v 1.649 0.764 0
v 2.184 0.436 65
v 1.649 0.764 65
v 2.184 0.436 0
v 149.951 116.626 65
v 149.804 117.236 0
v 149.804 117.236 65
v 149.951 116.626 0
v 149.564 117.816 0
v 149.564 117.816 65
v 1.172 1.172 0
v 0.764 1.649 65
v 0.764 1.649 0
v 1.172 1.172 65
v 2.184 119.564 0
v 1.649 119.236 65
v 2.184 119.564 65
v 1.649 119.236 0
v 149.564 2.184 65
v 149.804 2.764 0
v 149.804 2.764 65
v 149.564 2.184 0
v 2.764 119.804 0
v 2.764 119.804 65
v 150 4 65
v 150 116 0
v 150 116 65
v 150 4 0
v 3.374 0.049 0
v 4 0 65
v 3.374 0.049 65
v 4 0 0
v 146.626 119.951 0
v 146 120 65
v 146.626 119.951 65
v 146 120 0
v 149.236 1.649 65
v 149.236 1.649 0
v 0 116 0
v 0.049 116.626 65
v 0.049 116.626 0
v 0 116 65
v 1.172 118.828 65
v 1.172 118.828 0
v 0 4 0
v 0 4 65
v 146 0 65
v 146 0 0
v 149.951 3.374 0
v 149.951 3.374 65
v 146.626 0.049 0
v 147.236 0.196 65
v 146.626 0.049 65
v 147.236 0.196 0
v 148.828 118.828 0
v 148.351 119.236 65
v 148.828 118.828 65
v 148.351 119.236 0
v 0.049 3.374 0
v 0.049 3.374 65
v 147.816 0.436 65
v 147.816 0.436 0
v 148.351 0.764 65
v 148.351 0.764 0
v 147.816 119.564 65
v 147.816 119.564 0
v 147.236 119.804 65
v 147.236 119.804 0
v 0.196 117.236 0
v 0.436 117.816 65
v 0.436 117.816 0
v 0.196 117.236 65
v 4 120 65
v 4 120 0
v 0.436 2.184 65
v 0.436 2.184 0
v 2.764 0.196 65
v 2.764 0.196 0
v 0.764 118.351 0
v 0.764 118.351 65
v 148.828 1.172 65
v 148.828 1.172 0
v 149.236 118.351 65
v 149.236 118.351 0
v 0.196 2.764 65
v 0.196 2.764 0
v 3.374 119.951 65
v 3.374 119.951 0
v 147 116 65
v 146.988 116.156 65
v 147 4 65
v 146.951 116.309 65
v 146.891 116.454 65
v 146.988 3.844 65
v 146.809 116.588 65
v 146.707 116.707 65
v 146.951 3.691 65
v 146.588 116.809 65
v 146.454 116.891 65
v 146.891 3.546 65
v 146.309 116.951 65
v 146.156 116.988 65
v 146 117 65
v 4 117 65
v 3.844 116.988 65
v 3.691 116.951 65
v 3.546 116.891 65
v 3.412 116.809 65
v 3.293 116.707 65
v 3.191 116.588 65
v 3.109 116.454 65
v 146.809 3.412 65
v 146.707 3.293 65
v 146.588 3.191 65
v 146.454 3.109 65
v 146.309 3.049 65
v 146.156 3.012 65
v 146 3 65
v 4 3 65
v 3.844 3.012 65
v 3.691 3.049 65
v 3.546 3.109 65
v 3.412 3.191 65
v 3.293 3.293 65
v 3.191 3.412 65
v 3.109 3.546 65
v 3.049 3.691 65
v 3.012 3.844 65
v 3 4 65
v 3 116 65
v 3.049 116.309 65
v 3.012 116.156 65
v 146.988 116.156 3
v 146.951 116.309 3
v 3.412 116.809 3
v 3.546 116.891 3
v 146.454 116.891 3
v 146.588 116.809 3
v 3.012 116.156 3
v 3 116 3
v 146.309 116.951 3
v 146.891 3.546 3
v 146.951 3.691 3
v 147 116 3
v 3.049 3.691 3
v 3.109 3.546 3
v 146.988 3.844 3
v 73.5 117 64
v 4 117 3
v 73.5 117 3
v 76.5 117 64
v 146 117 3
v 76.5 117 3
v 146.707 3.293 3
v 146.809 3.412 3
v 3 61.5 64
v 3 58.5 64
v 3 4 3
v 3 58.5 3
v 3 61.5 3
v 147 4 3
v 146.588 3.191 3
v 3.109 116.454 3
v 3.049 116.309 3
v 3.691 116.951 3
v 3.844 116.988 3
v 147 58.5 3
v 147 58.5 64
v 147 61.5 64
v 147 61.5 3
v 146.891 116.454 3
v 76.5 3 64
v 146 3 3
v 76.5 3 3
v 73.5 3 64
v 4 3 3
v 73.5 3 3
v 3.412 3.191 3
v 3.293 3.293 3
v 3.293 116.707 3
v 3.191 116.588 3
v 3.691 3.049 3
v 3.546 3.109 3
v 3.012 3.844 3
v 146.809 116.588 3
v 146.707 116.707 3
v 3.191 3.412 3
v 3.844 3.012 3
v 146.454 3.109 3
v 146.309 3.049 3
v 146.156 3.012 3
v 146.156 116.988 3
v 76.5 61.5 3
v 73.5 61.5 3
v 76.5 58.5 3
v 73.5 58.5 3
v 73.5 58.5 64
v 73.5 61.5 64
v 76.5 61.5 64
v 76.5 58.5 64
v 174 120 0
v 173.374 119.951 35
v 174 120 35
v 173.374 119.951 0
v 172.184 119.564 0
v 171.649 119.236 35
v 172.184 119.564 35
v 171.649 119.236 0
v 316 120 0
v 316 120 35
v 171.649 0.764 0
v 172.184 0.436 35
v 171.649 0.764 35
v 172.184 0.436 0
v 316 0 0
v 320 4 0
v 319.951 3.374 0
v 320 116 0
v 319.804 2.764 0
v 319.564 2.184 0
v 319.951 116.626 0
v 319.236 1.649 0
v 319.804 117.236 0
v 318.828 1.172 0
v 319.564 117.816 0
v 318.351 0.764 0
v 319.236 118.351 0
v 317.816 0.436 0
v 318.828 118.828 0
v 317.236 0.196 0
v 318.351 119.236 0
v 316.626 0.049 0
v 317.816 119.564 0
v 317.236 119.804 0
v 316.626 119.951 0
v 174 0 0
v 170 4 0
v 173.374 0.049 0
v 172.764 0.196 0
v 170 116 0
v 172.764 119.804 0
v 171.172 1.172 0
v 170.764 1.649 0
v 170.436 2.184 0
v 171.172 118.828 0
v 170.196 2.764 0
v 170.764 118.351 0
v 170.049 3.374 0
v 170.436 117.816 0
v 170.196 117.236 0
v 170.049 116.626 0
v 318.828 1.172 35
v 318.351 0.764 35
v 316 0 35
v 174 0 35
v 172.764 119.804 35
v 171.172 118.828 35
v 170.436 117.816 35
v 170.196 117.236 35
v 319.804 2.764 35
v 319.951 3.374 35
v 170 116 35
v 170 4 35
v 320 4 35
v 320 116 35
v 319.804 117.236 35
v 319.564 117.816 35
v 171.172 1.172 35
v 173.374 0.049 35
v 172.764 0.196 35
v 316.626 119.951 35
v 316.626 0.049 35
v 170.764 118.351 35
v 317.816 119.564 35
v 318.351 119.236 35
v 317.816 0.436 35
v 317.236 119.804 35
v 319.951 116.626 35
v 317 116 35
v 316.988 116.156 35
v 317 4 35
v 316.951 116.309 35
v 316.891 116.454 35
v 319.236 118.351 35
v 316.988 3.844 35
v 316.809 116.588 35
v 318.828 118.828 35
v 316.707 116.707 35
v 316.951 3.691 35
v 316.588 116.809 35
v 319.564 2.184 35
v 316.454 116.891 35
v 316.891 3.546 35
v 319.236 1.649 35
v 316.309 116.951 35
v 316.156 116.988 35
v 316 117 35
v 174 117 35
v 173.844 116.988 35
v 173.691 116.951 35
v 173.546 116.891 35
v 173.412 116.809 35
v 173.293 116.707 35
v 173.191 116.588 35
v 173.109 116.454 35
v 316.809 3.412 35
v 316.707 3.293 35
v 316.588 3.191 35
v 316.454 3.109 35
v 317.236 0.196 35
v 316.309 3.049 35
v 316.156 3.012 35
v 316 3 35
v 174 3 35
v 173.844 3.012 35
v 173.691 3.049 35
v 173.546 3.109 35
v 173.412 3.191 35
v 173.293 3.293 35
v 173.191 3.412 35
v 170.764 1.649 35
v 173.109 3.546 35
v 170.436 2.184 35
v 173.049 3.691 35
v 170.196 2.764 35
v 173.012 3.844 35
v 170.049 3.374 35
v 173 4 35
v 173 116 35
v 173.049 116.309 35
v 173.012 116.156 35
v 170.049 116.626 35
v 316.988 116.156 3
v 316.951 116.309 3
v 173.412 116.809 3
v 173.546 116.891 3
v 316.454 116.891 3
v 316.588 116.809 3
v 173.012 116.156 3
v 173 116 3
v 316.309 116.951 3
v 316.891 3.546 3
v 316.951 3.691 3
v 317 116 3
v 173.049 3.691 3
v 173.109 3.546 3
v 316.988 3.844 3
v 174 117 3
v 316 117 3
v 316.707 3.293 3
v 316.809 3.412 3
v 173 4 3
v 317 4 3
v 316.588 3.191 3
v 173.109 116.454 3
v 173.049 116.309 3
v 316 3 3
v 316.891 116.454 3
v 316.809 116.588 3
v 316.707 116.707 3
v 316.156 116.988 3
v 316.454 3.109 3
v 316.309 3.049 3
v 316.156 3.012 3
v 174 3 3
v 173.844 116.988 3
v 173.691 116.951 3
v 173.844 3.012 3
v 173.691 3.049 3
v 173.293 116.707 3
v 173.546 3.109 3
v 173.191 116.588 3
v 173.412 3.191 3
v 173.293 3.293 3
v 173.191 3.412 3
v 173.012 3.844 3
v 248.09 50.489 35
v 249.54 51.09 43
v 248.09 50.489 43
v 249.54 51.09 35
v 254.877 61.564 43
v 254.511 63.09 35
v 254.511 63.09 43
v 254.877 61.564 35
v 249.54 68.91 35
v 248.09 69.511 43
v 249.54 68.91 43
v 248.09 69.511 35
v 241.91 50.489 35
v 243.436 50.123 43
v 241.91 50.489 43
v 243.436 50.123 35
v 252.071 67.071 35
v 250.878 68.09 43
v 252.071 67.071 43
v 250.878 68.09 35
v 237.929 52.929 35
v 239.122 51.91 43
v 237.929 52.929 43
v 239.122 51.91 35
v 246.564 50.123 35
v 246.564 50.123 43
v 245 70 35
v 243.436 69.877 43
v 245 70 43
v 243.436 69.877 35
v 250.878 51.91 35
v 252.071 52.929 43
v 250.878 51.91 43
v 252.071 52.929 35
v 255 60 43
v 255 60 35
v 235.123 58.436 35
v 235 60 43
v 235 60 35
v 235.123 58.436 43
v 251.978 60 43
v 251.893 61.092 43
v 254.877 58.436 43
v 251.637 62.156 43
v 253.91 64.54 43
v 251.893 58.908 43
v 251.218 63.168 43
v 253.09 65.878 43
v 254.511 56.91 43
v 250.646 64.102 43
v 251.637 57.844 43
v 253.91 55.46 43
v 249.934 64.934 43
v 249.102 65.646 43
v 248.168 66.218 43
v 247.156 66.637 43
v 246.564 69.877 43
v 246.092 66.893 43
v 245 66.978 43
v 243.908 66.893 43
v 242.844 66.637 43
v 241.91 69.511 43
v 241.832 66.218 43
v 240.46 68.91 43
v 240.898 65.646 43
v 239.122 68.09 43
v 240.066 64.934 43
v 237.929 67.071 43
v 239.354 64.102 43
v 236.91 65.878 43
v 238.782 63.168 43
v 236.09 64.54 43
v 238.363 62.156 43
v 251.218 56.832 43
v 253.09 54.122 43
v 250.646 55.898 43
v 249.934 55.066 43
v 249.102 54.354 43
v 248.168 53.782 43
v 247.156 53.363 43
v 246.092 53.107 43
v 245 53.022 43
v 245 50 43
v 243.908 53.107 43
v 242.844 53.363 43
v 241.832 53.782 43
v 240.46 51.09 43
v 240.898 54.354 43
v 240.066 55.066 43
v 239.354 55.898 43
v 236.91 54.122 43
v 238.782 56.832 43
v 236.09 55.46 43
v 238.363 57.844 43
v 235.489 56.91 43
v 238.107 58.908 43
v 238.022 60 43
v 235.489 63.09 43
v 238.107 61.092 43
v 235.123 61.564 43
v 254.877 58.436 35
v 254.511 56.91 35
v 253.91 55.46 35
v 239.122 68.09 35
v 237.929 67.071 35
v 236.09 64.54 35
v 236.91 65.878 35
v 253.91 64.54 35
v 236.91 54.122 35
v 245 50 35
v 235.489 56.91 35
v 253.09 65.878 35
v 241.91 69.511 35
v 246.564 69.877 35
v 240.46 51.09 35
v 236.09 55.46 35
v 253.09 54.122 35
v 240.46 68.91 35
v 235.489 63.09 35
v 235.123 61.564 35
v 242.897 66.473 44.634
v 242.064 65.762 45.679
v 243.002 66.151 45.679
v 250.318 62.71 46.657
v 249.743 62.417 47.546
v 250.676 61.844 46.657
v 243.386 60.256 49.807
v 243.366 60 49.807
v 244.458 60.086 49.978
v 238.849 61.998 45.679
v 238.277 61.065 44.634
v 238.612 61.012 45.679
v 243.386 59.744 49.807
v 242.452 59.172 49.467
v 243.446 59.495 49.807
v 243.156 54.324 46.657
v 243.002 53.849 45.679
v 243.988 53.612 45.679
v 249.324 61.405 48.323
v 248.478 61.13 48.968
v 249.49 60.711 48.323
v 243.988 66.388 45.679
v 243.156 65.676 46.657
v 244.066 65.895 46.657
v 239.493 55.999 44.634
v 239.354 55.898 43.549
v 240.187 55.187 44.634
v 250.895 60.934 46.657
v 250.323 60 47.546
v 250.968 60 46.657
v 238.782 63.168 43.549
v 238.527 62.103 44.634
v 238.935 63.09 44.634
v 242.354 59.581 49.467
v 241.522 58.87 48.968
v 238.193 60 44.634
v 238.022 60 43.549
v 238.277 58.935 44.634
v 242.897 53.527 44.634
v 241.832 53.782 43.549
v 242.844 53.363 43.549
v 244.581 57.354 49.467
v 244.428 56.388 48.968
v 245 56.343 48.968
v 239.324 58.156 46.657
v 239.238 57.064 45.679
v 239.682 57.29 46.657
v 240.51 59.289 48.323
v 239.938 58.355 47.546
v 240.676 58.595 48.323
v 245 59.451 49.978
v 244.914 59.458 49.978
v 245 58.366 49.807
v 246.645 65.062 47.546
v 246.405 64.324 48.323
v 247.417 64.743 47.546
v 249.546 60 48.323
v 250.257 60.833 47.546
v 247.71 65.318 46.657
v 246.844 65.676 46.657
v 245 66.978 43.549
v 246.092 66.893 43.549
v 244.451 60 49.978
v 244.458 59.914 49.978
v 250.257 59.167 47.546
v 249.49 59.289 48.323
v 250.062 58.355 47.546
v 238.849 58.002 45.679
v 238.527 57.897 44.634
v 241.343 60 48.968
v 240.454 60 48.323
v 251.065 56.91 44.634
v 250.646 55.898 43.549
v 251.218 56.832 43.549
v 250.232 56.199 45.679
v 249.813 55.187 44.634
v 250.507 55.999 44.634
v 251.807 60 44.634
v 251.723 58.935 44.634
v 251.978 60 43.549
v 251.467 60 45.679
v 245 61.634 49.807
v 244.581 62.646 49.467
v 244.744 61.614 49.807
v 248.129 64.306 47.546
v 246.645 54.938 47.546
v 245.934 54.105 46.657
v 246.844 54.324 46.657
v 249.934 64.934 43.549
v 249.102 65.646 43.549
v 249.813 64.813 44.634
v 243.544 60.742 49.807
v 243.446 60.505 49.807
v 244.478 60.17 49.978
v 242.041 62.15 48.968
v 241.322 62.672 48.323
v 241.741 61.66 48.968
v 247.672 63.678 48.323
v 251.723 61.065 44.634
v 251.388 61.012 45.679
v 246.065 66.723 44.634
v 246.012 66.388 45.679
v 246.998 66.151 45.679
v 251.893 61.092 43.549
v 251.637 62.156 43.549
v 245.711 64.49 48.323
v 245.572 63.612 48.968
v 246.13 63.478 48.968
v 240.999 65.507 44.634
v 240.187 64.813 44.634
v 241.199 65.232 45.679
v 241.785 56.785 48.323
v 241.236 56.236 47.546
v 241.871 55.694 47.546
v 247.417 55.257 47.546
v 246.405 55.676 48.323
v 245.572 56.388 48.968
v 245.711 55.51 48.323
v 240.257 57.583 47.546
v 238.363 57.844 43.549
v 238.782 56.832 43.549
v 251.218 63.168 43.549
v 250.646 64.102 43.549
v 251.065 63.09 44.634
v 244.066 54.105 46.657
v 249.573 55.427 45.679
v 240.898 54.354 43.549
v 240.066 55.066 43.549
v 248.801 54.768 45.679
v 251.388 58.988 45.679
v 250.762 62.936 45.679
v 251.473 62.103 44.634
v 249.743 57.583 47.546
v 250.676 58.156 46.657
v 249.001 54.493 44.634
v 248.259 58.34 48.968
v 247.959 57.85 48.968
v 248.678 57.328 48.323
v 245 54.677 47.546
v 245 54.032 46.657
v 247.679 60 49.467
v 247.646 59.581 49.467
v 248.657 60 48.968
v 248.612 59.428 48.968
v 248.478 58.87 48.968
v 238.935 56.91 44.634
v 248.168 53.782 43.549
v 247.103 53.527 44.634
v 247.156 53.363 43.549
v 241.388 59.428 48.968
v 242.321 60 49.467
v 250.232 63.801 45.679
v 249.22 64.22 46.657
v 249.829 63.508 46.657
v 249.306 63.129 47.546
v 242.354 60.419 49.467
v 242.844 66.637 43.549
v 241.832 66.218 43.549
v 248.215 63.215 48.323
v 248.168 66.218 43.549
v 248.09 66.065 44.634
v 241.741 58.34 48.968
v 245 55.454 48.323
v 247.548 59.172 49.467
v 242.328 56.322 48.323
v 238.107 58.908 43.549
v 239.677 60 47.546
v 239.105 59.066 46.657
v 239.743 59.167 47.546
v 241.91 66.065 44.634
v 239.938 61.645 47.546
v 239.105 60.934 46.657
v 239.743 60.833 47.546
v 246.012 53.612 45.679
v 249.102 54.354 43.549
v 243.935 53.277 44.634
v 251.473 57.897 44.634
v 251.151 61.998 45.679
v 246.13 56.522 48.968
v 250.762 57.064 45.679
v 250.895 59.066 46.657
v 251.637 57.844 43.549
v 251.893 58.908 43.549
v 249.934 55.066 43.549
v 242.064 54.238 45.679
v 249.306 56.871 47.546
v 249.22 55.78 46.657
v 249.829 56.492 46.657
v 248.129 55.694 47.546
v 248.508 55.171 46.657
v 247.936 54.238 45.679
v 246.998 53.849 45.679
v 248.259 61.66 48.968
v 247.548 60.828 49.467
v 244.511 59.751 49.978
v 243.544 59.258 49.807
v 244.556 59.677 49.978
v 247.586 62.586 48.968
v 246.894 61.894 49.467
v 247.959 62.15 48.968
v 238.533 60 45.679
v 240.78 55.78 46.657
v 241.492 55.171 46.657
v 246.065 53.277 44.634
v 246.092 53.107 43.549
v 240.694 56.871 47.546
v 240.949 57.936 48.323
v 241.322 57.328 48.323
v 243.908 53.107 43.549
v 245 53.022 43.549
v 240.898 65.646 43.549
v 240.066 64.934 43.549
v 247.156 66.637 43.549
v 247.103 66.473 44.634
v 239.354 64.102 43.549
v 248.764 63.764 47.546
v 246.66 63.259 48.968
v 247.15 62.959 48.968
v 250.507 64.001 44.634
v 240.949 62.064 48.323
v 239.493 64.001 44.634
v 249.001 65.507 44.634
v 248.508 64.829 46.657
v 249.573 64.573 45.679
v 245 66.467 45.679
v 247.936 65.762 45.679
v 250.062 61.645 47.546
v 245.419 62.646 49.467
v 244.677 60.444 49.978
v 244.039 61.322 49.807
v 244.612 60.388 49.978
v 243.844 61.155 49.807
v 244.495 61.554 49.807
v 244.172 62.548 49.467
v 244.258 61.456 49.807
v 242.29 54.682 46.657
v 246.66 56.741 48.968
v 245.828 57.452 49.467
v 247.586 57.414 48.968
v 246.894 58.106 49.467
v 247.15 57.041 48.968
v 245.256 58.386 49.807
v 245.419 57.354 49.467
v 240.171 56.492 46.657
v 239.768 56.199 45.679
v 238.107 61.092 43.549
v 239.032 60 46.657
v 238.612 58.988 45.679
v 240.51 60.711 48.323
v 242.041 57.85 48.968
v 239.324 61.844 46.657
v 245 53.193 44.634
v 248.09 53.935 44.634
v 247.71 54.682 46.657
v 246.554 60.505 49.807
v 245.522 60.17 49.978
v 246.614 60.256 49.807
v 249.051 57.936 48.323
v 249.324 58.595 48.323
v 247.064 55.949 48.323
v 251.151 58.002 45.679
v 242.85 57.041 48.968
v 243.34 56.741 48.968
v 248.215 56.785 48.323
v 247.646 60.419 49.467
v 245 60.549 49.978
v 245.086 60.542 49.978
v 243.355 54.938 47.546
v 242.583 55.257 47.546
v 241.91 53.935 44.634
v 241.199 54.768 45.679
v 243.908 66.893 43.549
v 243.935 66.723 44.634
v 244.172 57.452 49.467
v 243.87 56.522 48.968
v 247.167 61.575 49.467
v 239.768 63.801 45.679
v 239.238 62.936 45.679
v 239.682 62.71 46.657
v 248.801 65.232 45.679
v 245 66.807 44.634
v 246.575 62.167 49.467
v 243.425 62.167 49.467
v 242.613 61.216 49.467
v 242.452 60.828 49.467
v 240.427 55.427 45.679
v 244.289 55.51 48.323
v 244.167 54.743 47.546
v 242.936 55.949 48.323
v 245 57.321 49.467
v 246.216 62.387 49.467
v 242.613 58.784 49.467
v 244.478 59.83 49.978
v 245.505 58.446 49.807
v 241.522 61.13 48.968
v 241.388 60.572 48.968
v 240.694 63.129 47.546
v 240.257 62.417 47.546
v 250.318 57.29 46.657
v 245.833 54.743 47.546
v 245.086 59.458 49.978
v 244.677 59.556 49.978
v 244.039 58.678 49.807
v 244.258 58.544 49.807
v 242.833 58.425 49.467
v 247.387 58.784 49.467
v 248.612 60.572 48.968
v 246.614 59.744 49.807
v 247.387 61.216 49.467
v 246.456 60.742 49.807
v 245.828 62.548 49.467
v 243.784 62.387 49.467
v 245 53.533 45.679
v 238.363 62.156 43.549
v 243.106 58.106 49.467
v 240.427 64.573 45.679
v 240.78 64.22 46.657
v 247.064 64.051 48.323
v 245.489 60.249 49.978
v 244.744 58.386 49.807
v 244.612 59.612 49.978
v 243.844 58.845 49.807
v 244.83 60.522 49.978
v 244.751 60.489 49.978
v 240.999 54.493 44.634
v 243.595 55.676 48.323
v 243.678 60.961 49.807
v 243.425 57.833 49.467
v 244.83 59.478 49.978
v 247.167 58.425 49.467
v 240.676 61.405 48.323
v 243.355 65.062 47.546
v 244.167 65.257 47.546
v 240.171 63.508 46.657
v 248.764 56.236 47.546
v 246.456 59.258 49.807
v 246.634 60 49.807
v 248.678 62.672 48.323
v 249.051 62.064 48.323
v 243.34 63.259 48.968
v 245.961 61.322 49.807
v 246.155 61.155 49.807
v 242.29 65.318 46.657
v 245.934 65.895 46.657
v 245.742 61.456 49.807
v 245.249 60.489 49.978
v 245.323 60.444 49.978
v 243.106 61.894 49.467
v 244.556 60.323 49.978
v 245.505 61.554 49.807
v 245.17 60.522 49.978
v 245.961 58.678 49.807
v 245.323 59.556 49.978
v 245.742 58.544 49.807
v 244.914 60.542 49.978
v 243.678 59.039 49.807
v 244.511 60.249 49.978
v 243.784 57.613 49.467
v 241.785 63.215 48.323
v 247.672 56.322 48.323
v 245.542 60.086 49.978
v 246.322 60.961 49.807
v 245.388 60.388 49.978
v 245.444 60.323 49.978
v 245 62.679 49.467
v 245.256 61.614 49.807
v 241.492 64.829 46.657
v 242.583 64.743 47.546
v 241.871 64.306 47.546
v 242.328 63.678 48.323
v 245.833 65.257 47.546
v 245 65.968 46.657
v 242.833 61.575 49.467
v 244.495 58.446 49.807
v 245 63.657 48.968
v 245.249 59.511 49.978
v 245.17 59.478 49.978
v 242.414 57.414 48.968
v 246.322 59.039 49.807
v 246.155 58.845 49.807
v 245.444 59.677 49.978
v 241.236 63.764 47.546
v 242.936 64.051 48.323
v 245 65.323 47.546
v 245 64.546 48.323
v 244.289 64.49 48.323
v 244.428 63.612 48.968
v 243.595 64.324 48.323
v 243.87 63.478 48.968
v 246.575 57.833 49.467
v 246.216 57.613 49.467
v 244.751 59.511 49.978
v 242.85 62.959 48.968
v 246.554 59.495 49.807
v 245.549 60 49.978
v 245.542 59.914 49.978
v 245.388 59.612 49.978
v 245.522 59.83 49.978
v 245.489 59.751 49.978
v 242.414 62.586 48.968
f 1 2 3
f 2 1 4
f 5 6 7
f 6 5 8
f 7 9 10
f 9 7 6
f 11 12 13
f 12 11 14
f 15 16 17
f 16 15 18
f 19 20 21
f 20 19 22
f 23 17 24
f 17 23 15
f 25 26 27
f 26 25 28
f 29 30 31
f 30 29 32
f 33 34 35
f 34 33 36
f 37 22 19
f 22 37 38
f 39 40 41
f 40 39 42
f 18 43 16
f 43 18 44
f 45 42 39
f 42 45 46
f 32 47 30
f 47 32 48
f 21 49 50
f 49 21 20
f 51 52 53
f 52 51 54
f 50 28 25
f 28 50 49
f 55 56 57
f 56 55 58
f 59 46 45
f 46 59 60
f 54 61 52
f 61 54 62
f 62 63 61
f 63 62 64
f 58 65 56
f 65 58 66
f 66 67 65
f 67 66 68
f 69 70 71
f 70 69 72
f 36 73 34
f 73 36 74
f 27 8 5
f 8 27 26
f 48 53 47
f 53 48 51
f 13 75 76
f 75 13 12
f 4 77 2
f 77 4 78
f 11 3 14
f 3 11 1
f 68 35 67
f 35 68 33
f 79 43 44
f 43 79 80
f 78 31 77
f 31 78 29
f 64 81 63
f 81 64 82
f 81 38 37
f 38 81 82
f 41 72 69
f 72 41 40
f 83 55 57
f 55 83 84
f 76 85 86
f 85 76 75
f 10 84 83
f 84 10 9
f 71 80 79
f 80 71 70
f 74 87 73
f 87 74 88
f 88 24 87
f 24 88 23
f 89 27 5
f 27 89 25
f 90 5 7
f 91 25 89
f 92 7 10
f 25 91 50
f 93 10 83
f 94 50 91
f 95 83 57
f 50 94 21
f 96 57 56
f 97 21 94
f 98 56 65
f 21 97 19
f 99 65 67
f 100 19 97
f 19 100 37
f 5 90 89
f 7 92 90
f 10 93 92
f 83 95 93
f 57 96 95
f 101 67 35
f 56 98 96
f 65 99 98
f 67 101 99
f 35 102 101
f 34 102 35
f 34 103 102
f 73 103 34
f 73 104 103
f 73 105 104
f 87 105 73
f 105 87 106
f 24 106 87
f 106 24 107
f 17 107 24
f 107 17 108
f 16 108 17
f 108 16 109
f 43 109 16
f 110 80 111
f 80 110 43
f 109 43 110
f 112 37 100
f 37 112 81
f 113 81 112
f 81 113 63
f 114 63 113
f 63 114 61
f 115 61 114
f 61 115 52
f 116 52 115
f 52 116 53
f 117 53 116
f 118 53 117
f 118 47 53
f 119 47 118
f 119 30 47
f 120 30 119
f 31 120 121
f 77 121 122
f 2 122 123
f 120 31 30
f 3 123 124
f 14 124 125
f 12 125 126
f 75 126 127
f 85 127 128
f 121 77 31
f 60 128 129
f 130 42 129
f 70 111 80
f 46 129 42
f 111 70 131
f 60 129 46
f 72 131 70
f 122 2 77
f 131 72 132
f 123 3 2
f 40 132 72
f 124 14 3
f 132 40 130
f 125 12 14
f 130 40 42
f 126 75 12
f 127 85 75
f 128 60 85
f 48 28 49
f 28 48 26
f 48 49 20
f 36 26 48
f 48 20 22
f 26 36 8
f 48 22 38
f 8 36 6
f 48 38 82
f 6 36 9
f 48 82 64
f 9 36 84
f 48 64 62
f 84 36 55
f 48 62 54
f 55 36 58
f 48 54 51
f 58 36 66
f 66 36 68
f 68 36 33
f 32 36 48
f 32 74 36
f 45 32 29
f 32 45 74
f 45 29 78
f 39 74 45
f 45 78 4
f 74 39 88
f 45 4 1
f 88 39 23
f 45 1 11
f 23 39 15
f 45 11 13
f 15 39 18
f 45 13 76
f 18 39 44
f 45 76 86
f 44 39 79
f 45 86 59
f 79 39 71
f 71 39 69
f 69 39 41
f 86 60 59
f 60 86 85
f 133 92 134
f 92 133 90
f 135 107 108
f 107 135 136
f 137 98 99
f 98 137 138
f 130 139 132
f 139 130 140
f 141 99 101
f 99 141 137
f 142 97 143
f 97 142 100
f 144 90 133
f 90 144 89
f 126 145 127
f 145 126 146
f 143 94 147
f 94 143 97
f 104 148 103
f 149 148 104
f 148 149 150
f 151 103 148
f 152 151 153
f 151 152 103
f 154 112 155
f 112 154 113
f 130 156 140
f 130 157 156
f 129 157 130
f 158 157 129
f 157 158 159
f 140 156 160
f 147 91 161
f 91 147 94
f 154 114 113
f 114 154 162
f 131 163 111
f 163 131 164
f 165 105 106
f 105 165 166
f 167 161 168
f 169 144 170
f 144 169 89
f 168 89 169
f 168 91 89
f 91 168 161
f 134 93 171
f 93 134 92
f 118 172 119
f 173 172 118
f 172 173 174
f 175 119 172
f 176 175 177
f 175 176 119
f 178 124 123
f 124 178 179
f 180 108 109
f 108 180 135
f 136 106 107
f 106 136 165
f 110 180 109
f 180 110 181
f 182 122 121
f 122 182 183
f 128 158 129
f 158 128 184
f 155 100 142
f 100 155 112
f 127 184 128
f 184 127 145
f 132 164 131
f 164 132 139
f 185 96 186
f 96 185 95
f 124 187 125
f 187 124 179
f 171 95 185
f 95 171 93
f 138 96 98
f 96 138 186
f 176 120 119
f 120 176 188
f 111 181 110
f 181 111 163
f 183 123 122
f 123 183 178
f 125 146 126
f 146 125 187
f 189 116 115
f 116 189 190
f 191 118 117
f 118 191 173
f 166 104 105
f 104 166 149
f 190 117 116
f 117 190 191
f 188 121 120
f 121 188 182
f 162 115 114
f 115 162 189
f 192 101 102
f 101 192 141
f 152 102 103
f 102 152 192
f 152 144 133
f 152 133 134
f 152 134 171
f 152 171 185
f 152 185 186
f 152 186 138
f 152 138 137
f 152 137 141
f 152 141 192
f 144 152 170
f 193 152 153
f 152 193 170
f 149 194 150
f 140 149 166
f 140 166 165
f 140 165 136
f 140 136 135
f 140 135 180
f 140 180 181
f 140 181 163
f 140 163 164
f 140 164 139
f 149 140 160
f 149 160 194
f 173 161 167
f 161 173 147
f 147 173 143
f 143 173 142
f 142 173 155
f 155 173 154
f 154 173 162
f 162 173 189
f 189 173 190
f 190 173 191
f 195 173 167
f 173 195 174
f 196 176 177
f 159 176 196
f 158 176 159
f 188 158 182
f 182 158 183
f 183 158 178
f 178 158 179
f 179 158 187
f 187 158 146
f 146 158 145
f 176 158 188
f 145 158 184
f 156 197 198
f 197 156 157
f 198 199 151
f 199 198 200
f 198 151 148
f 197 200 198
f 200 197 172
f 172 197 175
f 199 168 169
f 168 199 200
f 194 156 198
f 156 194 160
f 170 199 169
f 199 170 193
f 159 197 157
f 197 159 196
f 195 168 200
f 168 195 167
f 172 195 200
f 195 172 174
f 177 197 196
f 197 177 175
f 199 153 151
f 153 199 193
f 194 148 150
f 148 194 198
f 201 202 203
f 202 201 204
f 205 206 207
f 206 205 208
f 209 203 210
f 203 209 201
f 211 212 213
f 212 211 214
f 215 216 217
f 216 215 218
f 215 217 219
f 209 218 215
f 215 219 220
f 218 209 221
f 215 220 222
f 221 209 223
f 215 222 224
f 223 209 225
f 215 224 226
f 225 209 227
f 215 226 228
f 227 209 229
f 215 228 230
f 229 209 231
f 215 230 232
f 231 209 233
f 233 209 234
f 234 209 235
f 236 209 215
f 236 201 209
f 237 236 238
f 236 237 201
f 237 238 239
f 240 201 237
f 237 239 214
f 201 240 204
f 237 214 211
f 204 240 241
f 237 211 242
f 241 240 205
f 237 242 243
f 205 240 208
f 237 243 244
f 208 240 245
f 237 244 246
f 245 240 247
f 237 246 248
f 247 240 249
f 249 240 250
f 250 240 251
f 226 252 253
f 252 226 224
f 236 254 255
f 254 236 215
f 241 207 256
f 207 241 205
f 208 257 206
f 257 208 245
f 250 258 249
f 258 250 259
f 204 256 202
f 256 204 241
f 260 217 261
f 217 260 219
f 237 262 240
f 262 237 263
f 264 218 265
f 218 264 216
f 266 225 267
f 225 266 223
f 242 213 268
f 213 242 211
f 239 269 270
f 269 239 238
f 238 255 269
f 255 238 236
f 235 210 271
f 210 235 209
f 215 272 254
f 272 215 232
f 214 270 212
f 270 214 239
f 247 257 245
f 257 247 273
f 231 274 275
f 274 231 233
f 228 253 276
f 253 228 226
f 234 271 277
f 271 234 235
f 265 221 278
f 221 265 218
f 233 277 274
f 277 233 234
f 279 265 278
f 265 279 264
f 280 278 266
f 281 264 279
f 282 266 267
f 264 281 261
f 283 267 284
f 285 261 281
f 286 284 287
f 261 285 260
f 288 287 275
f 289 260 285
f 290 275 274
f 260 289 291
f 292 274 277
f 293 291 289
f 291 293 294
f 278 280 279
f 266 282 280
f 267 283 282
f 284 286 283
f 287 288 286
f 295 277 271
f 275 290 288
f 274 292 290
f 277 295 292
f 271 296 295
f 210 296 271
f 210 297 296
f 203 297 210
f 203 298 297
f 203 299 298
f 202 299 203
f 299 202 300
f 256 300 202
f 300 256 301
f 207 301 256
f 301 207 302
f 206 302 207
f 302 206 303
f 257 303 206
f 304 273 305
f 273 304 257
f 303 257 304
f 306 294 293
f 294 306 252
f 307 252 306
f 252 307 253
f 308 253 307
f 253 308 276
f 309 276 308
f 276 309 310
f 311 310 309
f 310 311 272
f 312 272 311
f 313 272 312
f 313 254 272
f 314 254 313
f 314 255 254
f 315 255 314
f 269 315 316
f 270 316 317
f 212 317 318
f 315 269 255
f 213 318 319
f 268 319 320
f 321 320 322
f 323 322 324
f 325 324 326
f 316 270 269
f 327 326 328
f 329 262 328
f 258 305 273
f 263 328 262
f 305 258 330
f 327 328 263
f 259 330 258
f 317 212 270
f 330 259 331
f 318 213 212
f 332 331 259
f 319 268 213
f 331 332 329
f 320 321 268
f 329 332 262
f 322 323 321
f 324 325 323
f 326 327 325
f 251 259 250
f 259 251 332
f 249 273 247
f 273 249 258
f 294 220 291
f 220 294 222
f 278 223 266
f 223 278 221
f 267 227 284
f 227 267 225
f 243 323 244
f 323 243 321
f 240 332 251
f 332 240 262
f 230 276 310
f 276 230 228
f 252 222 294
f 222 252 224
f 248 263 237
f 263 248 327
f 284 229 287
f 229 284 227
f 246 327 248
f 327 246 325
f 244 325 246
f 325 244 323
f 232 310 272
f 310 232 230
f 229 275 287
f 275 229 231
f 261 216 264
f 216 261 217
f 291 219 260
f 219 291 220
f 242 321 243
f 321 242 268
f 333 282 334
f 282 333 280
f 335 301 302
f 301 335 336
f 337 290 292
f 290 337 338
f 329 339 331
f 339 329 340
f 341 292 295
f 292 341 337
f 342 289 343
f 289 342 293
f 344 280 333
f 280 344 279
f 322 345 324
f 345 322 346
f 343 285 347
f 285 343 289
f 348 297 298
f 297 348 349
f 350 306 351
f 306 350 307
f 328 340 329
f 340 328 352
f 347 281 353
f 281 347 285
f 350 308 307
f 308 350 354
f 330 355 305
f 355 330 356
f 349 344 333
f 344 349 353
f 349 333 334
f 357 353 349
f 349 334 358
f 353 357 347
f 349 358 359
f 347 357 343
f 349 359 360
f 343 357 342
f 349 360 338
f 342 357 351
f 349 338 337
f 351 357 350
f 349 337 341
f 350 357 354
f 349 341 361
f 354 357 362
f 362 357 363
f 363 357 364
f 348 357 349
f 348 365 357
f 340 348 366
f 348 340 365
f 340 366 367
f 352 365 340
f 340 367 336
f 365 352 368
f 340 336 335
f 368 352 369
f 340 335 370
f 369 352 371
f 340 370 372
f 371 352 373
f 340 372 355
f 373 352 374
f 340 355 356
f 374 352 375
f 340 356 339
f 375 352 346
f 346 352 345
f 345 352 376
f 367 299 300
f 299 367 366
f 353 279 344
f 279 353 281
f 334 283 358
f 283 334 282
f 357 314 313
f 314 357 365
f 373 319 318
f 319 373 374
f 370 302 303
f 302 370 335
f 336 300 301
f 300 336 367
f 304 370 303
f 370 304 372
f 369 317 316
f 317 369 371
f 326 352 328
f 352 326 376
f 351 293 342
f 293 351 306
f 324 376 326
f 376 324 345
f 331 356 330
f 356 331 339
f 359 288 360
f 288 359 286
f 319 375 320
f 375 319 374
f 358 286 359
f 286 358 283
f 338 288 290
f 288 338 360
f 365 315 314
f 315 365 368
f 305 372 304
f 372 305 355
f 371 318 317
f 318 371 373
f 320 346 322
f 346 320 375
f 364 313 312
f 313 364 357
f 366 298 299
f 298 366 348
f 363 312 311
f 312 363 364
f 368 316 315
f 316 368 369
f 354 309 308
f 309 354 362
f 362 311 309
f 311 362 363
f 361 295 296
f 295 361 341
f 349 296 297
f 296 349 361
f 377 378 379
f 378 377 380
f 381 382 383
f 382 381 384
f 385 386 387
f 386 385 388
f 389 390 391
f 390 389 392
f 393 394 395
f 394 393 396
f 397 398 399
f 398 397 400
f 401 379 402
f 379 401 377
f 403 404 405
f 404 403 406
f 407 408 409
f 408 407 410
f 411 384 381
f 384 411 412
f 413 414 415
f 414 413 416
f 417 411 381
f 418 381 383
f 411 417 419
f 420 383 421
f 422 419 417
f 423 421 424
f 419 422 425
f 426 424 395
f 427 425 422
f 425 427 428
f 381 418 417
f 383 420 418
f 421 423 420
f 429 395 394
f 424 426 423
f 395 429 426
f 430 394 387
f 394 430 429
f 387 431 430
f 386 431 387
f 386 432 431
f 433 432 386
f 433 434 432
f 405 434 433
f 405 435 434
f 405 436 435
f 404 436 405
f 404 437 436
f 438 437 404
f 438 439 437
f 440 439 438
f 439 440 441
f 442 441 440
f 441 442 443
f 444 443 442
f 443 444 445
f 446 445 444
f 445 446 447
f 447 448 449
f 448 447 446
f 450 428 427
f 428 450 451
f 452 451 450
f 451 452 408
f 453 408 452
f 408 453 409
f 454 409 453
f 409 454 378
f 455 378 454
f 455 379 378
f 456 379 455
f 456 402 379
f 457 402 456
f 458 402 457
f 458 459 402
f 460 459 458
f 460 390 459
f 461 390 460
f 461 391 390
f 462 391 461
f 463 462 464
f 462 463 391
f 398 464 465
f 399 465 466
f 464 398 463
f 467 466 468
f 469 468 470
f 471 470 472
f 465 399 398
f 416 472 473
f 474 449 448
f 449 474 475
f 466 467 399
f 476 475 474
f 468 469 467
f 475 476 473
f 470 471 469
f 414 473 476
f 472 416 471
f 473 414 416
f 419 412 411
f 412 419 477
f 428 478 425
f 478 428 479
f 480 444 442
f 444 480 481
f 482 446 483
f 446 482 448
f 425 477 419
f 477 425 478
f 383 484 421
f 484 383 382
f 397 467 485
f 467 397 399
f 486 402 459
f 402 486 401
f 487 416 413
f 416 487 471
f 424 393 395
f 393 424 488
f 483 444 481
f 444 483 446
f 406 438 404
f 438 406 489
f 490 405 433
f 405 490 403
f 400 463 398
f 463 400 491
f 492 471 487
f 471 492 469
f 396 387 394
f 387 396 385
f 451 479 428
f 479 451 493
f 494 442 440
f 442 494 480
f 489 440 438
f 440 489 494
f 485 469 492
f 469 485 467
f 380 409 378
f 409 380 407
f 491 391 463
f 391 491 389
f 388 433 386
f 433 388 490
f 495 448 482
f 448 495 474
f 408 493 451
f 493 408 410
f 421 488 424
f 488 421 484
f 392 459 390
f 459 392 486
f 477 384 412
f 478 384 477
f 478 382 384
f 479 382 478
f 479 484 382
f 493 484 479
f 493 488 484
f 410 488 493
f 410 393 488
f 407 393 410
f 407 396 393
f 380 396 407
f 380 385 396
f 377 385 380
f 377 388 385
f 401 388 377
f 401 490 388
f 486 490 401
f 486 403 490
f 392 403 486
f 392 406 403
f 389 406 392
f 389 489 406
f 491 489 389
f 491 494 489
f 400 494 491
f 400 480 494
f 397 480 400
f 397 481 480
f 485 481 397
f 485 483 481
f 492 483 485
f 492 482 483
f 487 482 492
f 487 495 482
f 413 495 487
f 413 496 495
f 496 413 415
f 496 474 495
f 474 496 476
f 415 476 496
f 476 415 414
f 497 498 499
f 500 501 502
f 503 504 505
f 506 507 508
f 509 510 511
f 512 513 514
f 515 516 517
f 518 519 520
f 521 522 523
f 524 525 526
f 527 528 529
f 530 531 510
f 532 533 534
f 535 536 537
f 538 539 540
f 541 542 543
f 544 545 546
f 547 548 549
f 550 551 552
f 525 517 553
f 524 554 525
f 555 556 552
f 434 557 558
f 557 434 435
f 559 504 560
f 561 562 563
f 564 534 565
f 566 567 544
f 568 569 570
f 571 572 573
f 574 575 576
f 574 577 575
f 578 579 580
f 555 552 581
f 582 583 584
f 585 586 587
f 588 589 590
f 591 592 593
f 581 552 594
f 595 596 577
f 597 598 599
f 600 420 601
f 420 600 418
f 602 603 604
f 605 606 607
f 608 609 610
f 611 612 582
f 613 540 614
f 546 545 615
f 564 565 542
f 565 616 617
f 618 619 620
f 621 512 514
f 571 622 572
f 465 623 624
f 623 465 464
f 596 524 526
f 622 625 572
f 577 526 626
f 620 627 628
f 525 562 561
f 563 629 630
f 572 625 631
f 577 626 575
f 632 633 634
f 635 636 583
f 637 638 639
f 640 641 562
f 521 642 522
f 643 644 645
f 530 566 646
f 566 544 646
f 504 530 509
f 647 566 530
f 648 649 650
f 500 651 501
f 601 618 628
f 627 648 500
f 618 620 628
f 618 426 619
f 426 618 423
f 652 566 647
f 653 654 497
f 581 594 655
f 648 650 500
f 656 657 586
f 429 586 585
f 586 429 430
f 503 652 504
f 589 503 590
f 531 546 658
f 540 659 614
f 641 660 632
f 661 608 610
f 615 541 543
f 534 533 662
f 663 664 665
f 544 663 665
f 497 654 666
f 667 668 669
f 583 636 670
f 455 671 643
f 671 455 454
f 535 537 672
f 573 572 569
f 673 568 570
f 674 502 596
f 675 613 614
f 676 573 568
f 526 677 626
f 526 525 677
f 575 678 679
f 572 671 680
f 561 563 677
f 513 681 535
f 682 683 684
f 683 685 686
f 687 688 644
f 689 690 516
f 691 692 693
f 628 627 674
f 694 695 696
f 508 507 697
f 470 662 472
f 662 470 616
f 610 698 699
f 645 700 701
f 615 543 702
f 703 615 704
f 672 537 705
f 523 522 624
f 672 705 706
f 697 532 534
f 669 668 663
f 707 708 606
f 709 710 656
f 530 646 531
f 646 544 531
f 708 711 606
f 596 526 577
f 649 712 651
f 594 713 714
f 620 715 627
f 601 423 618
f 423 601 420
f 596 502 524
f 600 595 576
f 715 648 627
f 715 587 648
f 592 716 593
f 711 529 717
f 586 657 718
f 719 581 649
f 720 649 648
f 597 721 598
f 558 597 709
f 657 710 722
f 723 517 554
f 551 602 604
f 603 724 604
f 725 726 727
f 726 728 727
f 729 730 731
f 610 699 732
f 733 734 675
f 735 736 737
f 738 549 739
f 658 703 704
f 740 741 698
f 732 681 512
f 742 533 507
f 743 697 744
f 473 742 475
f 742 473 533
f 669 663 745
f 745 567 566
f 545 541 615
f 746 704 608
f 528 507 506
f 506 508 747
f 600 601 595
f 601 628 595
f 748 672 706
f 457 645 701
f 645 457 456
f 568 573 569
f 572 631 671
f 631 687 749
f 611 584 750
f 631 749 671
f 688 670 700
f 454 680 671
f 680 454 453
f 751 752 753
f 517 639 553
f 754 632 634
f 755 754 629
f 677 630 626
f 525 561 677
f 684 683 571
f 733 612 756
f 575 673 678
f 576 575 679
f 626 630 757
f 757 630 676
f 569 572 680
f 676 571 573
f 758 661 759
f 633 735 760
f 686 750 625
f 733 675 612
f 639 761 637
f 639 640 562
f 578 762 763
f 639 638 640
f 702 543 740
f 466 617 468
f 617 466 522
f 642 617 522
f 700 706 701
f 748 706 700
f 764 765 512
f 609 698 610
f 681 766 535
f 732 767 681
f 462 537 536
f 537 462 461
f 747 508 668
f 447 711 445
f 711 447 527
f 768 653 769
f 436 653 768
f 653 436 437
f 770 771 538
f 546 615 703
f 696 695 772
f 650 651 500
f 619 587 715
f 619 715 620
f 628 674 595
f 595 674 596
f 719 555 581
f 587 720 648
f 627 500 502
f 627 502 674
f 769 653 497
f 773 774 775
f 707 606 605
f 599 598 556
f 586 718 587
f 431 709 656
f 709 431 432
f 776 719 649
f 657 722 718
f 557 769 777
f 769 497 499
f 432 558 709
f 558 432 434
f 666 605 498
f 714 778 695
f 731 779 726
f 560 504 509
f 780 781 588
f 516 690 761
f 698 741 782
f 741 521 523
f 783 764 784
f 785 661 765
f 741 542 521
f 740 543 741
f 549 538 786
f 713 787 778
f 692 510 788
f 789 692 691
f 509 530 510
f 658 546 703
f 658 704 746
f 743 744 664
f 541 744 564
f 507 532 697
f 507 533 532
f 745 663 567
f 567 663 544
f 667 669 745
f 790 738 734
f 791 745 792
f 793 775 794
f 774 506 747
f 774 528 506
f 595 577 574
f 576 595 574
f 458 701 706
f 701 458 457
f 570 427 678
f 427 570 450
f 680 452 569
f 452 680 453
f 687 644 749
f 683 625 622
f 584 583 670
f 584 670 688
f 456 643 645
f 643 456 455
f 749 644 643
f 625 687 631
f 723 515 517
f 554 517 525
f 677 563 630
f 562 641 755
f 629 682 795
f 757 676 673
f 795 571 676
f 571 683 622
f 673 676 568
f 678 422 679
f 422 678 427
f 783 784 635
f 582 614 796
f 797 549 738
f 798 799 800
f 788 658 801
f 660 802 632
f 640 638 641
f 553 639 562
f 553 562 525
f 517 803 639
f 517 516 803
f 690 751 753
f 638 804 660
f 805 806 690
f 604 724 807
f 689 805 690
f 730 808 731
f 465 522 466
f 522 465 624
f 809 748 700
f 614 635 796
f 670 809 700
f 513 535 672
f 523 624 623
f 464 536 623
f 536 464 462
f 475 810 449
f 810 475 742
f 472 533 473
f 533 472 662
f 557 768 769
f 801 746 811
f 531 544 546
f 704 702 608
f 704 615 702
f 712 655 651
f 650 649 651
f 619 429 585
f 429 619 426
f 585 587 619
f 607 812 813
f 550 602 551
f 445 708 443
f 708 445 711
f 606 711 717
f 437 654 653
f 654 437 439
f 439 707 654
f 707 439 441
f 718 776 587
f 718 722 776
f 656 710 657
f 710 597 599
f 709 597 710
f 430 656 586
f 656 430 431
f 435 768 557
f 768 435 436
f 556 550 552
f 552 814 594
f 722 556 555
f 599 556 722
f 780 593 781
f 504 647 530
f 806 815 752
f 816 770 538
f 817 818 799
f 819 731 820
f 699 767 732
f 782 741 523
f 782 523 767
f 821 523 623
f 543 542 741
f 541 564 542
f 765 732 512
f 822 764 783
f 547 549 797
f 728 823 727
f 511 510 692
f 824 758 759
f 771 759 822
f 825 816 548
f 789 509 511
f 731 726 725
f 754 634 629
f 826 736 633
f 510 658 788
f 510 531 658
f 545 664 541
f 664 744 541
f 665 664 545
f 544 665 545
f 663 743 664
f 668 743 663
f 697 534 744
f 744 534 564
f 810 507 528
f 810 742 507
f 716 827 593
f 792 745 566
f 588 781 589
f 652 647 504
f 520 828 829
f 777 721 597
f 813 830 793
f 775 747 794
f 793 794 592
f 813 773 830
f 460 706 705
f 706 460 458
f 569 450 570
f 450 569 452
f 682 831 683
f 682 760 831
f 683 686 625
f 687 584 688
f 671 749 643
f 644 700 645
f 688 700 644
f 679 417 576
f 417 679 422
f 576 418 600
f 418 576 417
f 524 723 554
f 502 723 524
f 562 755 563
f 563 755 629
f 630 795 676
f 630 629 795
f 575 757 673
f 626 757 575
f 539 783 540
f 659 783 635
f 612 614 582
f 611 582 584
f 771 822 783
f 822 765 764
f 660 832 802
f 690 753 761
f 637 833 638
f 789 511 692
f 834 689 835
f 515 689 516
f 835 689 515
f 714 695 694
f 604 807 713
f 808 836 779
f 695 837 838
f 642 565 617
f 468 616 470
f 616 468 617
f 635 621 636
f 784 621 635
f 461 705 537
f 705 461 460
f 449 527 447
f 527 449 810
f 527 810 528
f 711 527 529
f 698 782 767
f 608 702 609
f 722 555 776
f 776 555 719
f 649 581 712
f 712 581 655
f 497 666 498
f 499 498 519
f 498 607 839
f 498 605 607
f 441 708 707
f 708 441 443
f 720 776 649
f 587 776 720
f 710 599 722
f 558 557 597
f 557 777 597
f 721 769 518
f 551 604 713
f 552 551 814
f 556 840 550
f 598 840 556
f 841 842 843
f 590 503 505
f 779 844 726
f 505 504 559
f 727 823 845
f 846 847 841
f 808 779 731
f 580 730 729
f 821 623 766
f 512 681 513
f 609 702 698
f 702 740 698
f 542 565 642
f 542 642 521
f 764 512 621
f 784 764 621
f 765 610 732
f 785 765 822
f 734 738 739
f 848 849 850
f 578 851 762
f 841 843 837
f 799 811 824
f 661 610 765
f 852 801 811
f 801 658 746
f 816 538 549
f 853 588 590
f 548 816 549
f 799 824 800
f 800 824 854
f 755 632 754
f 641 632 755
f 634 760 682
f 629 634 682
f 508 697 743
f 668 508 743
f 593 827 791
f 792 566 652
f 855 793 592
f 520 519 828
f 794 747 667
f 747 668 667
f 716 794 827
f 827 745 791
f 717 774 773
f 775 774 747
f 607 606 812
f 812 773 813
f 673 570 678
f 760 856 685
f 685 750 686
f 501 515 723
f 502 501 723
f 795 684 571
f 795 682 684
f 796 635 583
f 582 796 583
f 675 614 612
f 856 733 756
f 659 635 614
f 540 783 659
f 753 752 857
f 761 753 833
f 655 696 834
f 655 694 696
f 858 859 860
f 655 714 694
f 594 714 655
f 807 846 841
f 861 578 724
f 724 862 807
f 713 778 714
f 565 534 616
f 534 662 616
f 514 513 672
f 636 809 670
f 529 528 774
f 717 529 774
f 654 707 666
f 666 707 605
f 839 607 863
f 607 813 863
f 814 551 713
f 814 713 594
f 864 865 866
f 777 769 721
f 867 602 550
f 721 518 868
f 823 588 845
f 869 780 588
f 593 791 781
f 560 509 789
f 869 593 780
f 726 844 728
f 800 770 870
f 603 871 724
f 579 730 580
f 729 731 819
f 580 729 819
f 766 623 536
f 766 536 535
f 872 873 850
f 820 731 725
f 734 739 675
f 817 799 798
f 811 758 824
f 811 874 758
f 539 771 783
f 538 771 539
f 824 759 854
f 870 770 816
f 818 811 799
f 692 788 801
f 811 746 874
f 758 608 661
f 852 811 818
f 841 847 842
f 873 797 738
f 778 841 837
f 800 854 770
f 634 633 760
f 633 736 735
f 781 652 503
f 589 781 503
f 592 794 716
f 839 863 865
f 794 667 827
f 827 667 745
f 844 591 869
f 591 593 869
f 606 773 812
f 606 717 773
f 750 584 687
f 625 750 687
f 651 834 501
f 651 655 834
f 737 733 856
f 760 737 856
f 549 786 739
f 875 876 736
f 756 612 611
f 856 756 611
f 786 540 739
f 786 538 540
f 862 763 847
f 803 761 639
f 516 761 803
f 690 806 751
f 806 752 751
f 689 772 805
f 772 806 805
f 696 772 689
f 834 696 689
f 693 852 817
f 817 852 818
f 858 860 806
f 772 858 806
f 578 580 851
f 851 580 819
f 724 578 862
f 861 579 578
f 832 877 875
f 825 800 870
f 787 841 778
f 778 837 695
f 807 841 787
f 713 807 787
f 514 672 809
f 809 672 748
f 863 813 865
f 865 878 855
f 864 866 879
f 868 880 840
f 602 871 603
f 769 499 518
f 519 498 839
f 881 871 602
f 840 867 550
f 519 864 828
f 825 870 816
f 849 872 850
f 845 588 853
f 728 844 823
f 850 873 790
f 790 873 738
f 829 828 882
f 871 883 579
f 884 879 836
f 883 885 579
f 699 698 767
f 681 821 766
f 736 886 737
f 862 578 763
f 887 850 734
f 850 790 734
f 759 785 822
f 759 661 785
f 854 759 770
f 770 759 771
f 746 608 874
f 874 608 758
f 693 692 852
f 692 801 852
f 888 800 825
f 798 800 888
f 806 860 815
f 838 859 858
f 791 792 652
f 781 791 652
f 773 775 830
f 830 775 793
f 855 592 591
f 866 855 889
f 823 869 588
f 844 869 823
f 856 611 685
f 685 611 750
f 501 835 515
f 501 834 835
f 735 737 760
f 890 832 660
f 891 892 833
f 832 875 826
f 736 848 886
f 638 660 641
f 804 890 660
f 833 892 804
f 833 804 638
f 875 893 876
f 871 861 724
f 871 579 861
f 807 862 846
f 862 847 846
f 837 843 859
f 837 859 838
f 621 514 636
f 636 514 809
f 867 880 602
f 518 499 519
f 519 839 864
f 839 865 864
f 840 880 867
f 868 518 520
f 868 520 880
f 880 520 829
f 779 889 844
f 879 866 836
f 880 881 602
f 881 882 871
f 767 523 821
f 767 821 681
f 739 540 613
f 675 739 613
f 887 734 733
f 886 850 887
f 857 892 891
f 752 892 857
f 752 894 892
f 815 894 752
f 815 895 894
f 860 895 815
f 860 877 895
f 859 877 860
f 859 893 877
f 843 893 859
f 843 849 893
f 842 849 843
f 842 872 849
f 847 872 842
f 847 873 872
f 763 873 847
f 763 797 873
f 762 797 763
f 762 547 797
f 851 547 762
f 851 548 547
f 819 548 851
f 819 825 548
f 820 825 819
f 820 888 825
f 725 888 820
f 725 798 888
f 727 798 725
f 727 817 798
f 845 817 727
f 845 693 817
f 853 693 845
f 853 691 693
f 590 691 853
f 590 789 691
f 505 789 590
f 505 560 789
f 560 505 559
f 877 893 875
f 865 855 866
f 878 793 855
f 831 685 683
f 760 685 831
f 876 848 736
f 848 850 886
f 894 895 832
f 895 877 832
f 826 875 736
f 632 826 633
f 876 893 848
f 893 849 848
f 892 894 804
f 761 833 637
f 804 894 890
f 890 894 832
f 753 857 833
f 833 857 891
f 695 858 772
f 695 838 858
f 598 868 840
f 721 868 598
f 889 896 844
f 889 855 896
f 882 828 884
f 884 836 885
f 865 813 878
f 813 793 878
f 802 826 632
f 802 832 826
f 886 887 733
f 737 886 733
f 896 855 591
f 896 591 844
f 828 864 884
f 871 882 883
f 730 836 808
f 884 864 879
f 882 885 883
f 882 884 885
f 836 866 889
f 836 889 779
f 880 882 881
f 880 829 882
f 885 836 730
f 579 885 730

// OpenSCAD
// Caixa Organizadora de Joias
// Dimensões: 150mm x 120mm x 100mm

// === PARÂMETROS ===
comp  = 150;   // comprimento (X)
larg  = 120;   // largura (Y)
alt   = 100;   // altura total (Z)
esp   = 3;     // espessura das paredes
r_ext = 4;     // raio do arredondamento externo
tampa_alt = 35; // altura da tampa

// Altura do corpo (sem a tampa)
corpo_alt = alt - tampa_alt;

// === MÓDULOS ===

// Caixa arredondada
module caixa_arredondada(cx, cy, cz, r, espessura) {
    difference() {
        // Externo
        hull() {
            for (x = [r, cx - r])
                for (y = [r, cy - r])
                    translate([x, y, 0])
                        cylinder(r=r, h=cz, $fn=40);
        }
        // Interno (cavidade)
        translate([espessura, espessura, espessura])
            hull() {
                ri = max(r - espessura, 1);
                cx2 = cx - 2*espessura;
                cy2 = cy - 2*espessura;
                for (x = [ri, cx2 - ri])
                    for (y = [ri, cy2 - ri])
                        translate([x, y, 0])
                            cylinder(r=ri, h=cz, $fn=40);
            }
    }
}

// === CORPO DA CAIXA ===
module corpo() {
    caixa_arredondada(comp, larg, corpo_alt, r_ext, esp);

    // Divisórias internas
    // Divisória longitudinal (divide em 2 fileiras)
    translate([esp, larg/2 - esp/2, esp])
        cube([comp - 2*esp, esp, corpo_alt - esp - 1]);

    // Divisória transversal fileira 1
    translate([comp/2 - esp/2, esp, esp])
        cube([esp, larg/2 - esp, corpo_alt - esp - 1]);

    // Divisória transversal fileira 2
    translate([comp/2 - esp/2, larg/2, esp])
        cube([esp, larg/2 - esp, corpo_alt - esp - 1]);
}

// === TAMPA ===
module tampa() {
    difference() {
        // Corpo da tampa
        caixa_arredondada(comp, larg, tampa_alt, r_ext, esp);

        // Encaixe (rebaixo para sentar no corpo)
        folga = 0.4;
        translate([esp + folga, esp + folga, esp])
            hull() {
                ri = max(r_ext - esp - folga, 1);
                cx2 = comp - 2*(esp + folga);
                cy2 = larg - 2*(esp + folga);
                for (x = [ri, cx2 - ri])
                    for (y = [ri, cy2 - ri])
                        translate([x, y, 0])
                            cylinder(r=ri, h=tampa_alt, $fn=40);
            }
    }

    // Puxador central na tampa
    translate([comp/2, larg/2, tampa_alt])
        cylinder(d=20, h=8, $fn=40);
    translate([comp/2, larg/2, tampa_alt + 8])
        sphere(d=14, $fn=40);
}

// === RENDERIZAÇÃO ===
// Corpo posicionado na origem
color("SandyBrown", 0.9)
    corpo();

// Tampa deslocada ao lado para visualização
color("Peru", 0.85)
    translate([comp + 20, 0, 0])
        tampa();
